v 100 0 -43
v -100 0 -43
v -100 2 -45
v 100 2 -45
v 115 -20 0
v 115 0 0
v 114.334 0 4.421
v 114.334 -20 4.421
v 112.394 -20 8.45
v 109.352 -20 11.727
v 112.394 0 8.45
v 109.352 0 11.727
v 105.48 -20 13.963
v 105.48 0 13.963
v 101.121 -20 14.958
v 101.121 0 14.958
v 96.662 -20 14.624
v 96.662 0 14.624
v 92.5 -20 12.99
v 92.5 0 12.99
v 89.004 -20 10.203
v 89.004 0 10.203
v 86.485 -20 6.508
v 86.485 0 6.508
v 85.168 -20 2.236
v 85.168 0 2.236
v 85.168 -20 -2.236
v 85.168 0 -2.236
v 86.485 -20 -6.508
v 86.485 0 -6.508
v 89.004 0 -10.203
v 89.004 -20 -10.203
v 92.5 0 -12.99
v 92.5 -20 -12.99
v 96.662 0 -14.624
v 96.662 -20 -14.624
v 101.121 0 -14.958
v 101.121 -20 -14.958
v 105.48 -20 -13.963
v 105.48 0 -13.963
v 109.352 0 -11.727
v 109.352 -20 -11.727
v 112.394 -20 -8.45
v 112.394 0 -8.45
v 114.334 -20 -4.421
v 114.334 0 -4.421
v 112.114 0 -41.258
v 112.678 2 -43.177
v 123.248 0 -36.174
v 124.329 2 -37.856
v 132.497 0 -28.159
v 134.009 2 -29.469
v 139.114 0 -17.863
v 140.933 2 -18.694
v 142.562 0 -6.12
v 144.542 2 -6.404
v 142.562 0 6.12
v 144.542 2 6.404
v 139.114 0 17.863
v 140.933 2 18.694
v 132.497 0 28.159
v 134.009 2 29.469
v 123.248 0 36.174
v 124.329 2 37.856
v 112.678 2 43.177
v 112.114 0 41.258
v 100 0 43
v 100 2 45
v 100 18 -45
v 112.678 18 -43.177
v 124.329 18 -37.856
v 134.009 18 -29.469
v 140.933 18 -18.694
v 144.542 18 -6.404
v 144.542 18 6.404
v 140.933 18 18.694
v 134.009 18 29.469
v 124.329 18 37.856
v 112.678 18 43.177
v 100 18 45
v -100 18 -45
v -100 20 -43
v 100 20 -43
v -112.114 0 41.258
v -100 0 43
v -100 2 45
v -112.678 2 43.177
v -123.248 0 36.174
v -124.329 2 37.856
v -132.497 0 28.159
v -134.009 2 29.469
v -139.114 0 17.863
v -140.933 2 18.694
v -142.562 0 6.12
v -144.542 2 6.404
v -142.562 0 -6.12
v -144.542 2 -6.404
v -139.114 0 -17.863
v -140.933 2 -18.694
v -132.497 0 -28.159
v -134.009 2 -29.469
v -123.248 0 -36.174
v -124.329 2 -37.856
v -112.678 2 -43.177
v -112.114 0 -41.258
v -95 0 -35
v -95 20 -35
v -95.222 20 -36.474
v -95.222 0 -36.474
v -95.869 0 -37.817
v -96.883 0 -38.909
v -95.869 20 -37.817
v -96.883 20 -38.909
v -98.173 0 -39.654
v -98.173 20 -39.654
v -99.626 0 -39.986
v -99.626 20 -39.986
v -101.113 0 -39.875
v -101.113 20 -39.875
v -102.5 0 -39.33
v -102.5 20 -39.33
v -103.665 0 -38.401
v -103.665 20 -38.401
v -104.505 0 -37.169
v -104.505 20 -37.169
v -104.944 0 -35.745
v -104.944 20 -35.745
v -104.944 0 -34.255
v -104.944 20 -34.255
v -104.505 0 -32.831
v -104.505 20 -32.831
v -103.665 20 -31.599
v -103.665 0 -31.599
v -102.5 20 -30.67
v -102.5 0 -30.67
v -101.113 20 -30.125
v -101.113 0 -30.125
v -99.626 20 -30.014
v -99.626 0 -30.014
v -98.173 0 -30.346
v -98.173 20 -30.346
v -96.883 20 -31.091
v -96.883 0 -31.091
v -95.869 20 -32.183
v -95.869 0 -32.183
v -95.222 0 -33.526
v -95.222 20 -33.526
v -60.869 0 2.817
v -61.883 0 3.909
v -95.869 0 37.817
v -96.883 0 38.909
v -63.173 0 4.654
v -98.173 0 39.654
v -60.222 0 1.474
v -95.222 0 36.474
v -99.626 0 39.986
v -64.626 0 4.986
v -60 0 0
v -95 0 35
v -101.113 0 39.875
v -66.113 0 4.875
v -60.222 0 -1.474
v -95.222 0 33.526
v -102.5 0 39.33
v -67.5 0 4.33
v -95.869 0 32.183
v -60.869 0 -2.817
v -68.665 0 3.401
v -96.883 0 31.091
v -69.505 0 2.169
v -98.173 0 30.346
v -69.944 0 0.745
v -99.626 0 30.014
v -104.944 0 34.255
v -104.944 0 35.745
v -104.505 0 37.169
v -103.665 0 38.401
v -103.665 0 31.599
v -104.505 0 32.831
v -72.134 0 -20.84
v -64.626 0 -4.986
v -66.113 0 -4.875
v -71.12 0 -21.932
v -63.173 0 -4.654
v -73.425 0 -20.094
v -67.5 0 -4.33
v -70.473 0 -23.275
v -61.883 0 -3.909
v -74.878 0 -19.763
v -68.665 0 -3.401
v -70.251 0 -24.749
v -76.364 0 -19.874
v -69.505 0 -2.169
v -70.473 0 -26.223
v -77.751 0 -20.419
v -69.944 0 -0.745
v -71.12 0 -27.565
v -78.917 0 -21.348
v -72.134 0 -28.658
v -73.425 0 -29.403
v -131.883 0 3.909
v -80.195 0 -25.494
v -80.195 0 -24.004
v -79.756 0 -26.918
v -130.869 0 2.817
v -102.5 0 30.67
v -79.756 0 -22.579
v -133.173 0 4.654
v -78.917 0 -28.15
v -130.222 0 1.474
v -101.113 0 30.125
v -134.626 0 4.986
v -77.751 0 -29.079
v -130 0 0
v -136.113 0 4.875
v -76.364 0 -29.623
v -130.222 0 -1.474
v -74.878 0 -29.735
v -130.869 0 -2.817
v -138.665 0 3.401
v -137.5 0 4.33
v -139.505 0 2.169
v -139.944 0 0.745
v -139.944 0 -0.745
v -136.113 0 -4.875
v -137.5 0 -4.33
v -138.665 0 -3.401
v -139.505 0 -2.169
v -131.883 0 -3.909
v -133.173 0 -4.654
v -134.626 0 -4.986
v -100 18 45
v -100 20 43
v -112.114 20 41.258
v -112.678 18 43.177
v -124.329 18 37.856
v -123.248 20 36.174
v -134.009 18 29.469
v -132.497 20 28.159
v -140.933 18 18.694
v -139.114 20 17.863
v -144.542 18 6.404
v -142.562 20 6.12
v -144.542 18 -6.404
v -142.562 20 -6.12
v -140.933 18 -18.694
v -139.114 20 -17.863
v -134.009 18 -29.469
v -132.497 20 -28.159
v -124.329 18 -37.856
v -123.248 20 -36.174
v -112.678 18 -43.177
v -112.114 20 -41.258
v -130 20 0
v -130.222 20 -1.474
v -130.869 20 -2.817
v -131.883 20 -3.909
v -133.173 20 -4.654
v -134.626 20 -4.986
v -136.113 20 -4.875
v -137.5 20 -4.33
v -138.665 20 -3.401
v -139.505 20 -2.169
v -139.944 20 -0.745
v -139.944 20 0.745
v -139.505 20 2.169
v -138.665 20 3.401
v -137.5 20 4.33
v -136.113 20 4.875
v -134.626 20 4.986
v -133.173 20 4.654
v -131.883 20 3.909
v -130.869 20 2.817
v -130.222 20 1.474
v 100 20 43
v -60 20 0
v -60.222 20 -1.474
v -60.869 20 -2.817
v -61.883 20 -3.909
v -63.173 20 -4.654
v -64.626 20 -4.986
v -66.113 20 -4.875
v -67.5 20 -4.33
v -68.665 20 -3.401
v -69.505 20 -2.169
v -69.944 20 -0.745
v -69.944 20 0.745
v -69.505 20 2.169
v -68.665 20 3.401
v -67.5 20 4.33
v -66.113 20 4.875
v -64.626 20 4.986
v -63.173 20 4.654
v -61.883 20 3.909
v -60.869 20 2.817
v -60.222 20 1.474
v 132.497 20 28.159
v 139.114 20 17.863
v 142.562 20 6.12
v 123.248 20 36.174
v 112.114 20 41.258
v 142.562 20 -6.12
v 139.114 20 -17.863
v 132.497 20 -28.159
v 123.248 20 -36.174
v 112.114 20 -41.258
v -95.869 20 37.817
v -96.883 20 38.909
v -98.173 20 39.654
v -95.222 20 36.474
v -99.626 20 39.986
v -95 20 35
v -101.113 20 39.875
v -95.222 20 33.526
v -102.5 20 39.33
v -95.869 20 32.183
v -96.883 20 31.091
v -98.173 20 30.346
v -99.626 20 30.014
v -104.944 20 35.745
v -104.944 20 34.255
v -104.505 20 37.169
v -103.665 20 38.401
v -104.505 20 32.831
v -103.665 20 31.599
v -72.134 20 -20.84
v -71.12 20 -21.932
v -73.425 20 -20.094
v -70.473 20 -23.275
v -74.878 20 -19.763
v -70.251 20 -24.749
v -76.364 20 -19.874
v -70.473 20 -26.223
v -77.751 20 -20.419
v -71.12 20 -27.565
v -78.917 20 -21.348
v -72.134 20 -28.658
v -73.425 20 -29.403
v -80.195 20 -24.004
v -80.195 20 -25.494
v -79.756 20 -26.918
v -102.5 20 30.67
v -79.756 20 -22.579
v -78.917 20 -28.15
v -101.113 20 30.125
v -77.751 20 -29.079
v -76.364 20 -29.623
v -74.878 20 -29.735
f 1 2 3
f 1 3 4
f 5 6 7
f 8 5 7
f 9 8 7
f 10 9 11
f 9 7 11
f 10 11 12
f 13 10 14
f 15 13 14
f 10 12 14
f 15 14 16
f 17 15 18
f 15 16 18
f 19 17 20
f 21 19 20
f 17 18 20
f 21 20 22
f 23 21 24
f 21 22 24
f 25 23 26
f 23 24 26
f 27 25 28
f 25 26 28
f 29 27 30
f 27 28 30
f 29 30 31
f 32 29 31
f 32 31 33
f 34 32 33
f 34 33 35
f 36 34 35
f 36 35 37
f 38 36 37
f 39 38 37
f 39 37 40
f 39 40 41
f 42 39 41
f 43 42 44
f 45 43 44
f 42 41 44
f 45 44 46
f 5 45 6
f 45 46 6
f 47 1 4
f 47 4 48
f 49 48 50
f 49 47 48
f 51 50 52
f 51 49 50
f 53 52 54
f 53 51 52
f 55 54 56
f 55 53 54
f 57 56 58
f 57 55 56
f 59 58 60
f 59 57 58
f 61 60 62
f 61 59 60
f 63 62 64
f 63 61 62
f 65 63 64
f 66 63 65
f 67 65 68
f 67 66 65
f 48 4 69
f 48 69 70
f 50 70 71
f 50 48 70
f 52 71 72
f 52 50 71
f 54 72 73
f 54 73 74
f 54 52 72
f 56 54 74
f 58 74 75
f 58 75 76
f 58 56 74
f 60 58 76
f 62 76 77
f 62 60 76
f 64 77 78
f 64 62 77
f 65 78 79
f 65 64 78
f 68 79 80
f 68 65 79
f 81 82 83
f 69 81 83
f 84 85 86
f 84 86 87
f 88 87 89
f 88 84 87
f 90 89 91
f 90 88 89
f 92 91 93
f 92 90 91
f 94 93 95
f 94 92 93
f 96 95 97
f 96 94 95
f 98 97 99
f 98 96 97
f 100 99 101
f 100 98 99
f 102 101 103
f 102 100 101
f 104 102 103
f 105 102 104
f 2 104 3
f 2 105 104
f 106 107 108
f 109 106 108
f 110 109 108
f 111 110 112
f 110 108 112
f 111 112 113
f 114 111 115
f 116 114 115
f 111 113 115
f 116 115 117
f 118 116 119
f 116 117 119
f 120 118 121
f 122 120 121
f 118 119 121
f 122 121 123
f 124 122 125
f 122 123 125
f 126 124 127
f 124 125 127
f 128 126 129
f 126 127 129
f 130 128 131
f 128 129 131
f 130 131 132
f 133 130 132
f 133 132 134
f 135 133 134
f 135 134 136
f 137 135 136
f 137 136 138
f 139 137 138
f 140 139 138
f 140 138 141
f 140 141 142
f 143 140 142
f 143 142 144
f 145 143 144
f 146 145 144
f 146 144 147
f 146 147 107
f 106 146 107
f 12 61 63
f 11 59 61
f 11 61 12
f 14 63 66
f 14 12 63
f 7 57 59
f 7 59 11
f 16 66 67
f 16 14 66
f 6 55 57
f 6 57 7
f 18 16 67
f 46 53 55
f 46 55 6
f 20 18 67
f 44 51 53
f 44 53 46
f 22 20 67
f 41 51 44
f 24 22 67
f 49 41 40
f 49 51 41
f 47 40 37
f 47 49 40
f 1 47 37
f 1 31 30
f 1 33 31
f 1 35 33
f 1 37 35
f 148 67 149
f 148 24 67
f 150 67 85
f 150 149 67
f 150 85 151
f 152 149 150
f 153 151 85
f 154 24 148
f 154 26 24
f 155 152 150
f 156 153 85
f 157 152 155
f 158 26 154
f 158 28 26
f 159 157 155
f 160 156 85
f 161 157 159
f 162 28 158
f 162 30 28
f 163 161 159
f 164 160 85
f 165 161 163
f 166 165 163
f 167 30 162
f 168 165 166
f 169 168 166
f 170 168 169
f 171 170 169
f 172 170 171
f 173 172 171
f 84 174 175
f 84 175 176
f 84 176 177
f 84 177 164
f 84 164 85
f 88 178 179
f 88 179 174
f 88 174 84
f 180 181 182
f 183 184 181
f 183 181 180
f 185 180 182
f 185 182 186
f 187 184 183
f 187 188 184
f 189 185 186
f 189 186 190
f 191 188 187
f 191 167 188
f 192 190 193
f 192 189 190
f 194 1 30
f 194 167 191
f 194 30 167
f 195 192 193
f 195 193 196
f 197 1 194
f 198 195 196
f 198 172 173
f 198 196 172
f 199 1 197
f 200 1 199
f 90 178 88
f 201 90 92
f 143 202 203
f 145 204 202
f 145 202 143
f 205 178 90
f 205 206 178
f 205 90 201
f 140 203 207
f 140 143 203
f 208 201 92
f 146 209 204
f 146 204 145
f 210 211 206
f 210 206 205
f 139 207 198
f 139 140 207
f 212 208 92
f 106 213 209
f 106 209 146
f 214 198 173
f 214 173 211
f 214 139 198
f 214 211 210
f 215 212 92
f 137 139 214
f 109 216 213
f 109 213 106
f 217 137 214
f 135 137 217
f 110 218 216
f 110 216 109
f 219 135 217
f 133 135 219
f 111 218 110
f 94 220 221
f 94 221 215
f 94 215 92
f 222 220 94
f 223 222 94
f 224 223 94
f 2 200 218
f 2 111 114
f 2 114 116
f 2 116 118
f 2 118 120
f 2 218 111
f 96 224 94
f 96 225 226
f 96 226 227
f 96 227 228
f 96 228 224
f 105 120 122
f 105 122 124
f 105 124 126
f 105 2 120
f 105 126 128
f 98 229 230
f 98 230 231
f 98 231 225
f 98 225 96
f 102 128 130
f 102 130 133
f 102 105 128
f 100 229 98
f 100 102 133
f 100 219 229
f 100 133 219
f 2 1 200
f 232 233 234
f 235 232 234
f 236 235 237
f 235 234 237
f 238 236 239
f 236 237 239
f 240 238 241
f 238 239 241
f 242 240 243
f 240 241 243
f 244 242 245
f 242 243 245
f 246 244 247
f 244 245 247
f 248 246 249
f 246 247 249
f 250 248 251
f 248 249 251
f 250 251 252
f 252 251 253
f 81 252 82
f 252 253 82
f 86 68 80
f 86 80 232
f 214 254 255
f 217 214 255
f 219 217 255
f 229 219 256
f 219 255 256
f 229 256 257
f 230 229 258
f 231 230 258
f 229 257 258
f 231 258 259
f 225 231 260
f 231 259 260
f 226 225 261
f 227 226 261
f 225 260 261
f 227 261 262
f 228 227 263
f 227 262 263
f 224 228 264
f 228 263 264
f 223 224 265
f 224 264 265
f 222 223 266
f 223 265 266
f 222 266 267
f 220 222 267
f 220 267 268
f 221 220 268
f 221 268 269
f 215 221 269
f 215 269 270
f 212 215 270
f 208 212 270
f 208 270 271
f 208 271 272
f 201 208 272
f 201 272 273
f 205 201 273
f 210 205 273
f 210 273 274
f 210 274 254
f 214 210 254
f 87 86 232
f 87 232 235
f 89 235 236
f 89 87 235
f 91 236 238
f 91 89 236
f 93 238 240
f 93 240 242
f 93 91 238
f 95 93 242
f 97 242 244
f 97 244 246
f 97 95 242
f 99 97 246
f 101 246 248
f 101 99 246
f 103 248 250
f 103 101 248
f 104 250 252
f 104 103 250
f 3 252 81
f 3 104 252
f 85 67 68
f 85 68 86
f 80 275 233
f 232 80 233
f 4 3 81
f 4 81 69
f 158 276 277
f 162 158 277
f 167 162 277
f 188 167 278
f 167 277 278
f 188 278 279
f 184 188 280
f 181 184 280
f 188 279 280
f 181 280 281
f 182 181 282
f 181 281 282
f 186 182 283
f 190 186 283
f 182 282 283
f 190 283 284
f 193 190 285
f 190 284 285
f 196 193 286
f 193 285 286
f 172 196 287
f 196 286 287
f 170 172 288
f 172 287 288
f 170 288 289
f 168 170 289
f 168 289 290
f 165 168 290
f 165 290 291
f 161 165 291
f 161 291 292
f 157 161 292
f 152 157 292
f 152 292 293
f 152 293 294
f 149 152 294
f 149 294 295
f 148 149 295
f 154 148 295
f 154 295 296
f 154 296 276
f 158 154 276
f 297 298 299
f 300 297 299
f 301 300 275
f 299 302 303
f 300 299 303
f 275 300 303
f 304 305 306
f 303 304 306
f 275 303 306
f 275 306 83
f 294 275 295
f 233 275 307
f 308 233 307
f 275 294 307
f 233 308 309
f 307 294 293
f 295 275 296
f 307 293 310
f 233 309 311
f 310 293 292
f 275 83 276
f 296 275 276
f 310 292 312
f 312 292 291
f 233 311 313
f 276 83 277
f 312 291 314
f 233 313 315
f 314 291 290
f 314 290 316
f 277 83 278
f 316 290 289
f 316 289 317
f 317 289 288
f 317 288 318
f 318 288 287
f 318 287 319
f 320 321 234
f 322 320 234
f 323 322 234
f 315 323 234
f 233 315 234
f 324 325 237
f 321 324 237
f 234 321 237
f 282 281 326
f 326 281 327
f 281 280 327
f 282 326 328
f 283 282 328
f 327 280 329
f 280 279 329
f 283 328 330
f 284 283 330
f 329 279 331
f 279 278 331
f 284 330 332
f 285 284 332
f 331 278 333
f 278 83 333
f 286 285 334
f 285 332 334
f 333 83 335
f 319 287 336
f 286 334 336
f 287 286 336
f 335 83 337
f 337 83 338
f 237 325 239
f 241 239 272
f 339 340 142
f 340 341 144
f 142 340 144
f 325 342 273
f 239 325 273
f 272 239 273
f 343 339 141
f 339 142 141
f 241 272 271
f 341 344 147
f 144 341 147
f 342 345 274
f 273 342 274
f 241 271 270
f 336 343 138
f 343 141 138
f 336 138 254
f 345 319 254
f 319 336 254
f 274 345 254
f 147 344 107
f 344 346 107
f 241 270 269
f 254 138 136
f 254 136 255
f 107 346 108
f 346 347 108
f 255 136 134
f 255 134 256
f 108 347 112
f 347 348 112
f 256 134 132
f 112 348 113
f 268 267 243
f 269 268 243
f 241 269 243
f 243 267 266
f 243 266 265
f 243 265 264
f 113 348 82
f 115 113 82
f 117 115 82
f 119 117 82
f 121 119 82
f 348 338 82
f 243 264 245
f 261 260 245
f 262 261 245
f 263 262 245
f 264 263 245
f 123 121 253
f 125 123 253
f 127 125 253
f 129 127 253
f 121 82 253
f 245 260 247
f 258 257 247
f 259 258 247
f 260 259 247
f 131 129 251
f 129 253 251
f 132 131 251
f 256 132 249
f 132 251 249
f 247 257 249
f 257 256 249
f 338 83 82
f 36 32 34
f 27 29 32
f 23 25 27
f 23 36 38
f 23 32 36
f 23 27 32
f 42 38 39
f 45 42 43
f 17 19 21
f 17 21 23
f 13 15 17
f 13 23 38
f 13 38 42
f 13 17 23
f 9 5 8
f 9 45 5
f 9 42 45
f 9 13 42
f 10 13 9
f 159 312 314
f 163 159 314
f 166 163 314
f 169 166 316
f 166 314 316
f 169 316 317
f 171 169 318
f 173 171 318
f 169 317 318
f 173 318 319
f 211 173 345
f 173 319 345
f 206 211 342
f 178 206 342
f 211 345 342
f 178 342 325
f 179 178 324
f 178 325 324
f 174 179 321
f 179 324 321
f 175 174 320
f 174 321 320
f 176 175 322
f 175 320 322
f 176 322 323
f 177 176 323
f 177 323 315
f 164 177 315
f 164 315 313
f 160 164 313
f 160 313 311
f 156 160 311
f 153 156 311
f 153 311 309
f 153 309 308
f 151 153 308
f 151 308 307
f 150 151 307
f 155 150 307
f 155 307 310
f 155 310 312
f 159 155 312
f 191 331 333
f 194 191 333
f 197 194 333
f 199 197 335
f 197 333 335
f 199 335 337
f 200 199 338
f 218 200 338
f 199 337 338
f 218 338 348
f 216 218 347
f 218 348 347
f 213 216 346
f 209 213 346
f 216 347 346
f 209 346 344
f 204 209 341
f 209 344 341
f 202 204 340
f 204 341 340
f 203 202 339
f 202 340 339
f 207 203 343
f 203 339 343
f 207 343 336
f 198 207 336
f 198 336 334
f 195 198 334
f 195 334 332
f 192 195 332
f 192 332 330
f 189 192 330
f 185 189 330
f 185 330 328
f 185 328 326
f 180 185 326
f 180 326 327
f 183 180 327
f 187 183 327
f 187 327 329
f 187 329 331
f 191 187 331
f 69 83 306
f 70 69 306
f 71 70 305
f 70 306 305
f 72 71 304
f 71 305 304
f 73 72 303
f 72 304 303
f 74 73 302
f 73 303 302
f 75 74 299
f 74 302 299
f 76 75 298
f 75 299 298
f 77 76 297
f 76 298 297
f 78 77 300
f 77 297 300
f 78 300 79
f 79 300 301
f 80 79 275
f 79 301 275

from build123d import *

# Parameters (mm, degrees)
BOSS_EXTRUDE1_DEPTH = 20
SKETCH2_R           = 5
CUT_EXTRUDE1_DEPTH  = 21
SKETCH3_R           = 15
BOSS_EXTRUDE2_DEPTH = 20
CHAMFER1_SIZE       = 2


with BuildPart() as part:
    # Sketch1 → Boss-Extrude1 (new body)
    with BuildSketch(Plane(origin=(0, 0, 0), x_dir=(1, 0, 0), z_dir=(0, 1, 0))):
        with BuildLine():
            Line((-100, 45), (100, 45))
            ThreePointArc((100, 45), (145, 0), (100, -45))
            Line((100, -45), (-100, -45))
            ThreePointArc((-100, -45), (-145, 0), (-100, 45))
        make_face()
    extrude(amount=BOSS_EXTRUDE1_DEPTH)

    # Sketch2 → Cut-Extrude1 (cut, through all)
    with BuildSketch(Plane(origin=(0, 20, 0), x_dir=(1, 0, 0), z_dir=(0, 1, 0))):
        with Locations((-135, 0)):
            Circle(SKETCH2_R)
        with Locations((-100, 35)):
            Circle(SKETCH2_R)
        with Locations((-65, 0)):
            Circle(SKETCH2_R)
        with Locations((-100, -35)):
            Circle(SKETCH2_R)
        with Locations((-75.251262658, 24.748737342)):
            Circle(SKETCH2_R)
    extrude(amount=-CUT_EXTRUDE1_DEPTH, mode=Mode.SUBTRACT)

    # Sketch3 → Boss-Extrude2 (add)
    with BuildSketch(Plane.XZ):
        with Locations((100, 0)):
            Circle(SKETCH3_R)
    extrude(amount=BOSS_EXTRUDE2_DEPTH)

    # Chamfer1
    chamfer1_edges = [part.edges().sort_by_distance(p)[0] for p in [
        (145, 20, 0),
        (0, 20, -45),
        (-145, 20, 0),
        (0, 0, -45),
        (145, 0, 0),
        (0, 0, 45),
        (-145, 0, 0),
        (0, 20, 45),
    ]]
    chamfer(chamfer1_edges, length=CHAMFER1_SIZE)


solid = part.part
